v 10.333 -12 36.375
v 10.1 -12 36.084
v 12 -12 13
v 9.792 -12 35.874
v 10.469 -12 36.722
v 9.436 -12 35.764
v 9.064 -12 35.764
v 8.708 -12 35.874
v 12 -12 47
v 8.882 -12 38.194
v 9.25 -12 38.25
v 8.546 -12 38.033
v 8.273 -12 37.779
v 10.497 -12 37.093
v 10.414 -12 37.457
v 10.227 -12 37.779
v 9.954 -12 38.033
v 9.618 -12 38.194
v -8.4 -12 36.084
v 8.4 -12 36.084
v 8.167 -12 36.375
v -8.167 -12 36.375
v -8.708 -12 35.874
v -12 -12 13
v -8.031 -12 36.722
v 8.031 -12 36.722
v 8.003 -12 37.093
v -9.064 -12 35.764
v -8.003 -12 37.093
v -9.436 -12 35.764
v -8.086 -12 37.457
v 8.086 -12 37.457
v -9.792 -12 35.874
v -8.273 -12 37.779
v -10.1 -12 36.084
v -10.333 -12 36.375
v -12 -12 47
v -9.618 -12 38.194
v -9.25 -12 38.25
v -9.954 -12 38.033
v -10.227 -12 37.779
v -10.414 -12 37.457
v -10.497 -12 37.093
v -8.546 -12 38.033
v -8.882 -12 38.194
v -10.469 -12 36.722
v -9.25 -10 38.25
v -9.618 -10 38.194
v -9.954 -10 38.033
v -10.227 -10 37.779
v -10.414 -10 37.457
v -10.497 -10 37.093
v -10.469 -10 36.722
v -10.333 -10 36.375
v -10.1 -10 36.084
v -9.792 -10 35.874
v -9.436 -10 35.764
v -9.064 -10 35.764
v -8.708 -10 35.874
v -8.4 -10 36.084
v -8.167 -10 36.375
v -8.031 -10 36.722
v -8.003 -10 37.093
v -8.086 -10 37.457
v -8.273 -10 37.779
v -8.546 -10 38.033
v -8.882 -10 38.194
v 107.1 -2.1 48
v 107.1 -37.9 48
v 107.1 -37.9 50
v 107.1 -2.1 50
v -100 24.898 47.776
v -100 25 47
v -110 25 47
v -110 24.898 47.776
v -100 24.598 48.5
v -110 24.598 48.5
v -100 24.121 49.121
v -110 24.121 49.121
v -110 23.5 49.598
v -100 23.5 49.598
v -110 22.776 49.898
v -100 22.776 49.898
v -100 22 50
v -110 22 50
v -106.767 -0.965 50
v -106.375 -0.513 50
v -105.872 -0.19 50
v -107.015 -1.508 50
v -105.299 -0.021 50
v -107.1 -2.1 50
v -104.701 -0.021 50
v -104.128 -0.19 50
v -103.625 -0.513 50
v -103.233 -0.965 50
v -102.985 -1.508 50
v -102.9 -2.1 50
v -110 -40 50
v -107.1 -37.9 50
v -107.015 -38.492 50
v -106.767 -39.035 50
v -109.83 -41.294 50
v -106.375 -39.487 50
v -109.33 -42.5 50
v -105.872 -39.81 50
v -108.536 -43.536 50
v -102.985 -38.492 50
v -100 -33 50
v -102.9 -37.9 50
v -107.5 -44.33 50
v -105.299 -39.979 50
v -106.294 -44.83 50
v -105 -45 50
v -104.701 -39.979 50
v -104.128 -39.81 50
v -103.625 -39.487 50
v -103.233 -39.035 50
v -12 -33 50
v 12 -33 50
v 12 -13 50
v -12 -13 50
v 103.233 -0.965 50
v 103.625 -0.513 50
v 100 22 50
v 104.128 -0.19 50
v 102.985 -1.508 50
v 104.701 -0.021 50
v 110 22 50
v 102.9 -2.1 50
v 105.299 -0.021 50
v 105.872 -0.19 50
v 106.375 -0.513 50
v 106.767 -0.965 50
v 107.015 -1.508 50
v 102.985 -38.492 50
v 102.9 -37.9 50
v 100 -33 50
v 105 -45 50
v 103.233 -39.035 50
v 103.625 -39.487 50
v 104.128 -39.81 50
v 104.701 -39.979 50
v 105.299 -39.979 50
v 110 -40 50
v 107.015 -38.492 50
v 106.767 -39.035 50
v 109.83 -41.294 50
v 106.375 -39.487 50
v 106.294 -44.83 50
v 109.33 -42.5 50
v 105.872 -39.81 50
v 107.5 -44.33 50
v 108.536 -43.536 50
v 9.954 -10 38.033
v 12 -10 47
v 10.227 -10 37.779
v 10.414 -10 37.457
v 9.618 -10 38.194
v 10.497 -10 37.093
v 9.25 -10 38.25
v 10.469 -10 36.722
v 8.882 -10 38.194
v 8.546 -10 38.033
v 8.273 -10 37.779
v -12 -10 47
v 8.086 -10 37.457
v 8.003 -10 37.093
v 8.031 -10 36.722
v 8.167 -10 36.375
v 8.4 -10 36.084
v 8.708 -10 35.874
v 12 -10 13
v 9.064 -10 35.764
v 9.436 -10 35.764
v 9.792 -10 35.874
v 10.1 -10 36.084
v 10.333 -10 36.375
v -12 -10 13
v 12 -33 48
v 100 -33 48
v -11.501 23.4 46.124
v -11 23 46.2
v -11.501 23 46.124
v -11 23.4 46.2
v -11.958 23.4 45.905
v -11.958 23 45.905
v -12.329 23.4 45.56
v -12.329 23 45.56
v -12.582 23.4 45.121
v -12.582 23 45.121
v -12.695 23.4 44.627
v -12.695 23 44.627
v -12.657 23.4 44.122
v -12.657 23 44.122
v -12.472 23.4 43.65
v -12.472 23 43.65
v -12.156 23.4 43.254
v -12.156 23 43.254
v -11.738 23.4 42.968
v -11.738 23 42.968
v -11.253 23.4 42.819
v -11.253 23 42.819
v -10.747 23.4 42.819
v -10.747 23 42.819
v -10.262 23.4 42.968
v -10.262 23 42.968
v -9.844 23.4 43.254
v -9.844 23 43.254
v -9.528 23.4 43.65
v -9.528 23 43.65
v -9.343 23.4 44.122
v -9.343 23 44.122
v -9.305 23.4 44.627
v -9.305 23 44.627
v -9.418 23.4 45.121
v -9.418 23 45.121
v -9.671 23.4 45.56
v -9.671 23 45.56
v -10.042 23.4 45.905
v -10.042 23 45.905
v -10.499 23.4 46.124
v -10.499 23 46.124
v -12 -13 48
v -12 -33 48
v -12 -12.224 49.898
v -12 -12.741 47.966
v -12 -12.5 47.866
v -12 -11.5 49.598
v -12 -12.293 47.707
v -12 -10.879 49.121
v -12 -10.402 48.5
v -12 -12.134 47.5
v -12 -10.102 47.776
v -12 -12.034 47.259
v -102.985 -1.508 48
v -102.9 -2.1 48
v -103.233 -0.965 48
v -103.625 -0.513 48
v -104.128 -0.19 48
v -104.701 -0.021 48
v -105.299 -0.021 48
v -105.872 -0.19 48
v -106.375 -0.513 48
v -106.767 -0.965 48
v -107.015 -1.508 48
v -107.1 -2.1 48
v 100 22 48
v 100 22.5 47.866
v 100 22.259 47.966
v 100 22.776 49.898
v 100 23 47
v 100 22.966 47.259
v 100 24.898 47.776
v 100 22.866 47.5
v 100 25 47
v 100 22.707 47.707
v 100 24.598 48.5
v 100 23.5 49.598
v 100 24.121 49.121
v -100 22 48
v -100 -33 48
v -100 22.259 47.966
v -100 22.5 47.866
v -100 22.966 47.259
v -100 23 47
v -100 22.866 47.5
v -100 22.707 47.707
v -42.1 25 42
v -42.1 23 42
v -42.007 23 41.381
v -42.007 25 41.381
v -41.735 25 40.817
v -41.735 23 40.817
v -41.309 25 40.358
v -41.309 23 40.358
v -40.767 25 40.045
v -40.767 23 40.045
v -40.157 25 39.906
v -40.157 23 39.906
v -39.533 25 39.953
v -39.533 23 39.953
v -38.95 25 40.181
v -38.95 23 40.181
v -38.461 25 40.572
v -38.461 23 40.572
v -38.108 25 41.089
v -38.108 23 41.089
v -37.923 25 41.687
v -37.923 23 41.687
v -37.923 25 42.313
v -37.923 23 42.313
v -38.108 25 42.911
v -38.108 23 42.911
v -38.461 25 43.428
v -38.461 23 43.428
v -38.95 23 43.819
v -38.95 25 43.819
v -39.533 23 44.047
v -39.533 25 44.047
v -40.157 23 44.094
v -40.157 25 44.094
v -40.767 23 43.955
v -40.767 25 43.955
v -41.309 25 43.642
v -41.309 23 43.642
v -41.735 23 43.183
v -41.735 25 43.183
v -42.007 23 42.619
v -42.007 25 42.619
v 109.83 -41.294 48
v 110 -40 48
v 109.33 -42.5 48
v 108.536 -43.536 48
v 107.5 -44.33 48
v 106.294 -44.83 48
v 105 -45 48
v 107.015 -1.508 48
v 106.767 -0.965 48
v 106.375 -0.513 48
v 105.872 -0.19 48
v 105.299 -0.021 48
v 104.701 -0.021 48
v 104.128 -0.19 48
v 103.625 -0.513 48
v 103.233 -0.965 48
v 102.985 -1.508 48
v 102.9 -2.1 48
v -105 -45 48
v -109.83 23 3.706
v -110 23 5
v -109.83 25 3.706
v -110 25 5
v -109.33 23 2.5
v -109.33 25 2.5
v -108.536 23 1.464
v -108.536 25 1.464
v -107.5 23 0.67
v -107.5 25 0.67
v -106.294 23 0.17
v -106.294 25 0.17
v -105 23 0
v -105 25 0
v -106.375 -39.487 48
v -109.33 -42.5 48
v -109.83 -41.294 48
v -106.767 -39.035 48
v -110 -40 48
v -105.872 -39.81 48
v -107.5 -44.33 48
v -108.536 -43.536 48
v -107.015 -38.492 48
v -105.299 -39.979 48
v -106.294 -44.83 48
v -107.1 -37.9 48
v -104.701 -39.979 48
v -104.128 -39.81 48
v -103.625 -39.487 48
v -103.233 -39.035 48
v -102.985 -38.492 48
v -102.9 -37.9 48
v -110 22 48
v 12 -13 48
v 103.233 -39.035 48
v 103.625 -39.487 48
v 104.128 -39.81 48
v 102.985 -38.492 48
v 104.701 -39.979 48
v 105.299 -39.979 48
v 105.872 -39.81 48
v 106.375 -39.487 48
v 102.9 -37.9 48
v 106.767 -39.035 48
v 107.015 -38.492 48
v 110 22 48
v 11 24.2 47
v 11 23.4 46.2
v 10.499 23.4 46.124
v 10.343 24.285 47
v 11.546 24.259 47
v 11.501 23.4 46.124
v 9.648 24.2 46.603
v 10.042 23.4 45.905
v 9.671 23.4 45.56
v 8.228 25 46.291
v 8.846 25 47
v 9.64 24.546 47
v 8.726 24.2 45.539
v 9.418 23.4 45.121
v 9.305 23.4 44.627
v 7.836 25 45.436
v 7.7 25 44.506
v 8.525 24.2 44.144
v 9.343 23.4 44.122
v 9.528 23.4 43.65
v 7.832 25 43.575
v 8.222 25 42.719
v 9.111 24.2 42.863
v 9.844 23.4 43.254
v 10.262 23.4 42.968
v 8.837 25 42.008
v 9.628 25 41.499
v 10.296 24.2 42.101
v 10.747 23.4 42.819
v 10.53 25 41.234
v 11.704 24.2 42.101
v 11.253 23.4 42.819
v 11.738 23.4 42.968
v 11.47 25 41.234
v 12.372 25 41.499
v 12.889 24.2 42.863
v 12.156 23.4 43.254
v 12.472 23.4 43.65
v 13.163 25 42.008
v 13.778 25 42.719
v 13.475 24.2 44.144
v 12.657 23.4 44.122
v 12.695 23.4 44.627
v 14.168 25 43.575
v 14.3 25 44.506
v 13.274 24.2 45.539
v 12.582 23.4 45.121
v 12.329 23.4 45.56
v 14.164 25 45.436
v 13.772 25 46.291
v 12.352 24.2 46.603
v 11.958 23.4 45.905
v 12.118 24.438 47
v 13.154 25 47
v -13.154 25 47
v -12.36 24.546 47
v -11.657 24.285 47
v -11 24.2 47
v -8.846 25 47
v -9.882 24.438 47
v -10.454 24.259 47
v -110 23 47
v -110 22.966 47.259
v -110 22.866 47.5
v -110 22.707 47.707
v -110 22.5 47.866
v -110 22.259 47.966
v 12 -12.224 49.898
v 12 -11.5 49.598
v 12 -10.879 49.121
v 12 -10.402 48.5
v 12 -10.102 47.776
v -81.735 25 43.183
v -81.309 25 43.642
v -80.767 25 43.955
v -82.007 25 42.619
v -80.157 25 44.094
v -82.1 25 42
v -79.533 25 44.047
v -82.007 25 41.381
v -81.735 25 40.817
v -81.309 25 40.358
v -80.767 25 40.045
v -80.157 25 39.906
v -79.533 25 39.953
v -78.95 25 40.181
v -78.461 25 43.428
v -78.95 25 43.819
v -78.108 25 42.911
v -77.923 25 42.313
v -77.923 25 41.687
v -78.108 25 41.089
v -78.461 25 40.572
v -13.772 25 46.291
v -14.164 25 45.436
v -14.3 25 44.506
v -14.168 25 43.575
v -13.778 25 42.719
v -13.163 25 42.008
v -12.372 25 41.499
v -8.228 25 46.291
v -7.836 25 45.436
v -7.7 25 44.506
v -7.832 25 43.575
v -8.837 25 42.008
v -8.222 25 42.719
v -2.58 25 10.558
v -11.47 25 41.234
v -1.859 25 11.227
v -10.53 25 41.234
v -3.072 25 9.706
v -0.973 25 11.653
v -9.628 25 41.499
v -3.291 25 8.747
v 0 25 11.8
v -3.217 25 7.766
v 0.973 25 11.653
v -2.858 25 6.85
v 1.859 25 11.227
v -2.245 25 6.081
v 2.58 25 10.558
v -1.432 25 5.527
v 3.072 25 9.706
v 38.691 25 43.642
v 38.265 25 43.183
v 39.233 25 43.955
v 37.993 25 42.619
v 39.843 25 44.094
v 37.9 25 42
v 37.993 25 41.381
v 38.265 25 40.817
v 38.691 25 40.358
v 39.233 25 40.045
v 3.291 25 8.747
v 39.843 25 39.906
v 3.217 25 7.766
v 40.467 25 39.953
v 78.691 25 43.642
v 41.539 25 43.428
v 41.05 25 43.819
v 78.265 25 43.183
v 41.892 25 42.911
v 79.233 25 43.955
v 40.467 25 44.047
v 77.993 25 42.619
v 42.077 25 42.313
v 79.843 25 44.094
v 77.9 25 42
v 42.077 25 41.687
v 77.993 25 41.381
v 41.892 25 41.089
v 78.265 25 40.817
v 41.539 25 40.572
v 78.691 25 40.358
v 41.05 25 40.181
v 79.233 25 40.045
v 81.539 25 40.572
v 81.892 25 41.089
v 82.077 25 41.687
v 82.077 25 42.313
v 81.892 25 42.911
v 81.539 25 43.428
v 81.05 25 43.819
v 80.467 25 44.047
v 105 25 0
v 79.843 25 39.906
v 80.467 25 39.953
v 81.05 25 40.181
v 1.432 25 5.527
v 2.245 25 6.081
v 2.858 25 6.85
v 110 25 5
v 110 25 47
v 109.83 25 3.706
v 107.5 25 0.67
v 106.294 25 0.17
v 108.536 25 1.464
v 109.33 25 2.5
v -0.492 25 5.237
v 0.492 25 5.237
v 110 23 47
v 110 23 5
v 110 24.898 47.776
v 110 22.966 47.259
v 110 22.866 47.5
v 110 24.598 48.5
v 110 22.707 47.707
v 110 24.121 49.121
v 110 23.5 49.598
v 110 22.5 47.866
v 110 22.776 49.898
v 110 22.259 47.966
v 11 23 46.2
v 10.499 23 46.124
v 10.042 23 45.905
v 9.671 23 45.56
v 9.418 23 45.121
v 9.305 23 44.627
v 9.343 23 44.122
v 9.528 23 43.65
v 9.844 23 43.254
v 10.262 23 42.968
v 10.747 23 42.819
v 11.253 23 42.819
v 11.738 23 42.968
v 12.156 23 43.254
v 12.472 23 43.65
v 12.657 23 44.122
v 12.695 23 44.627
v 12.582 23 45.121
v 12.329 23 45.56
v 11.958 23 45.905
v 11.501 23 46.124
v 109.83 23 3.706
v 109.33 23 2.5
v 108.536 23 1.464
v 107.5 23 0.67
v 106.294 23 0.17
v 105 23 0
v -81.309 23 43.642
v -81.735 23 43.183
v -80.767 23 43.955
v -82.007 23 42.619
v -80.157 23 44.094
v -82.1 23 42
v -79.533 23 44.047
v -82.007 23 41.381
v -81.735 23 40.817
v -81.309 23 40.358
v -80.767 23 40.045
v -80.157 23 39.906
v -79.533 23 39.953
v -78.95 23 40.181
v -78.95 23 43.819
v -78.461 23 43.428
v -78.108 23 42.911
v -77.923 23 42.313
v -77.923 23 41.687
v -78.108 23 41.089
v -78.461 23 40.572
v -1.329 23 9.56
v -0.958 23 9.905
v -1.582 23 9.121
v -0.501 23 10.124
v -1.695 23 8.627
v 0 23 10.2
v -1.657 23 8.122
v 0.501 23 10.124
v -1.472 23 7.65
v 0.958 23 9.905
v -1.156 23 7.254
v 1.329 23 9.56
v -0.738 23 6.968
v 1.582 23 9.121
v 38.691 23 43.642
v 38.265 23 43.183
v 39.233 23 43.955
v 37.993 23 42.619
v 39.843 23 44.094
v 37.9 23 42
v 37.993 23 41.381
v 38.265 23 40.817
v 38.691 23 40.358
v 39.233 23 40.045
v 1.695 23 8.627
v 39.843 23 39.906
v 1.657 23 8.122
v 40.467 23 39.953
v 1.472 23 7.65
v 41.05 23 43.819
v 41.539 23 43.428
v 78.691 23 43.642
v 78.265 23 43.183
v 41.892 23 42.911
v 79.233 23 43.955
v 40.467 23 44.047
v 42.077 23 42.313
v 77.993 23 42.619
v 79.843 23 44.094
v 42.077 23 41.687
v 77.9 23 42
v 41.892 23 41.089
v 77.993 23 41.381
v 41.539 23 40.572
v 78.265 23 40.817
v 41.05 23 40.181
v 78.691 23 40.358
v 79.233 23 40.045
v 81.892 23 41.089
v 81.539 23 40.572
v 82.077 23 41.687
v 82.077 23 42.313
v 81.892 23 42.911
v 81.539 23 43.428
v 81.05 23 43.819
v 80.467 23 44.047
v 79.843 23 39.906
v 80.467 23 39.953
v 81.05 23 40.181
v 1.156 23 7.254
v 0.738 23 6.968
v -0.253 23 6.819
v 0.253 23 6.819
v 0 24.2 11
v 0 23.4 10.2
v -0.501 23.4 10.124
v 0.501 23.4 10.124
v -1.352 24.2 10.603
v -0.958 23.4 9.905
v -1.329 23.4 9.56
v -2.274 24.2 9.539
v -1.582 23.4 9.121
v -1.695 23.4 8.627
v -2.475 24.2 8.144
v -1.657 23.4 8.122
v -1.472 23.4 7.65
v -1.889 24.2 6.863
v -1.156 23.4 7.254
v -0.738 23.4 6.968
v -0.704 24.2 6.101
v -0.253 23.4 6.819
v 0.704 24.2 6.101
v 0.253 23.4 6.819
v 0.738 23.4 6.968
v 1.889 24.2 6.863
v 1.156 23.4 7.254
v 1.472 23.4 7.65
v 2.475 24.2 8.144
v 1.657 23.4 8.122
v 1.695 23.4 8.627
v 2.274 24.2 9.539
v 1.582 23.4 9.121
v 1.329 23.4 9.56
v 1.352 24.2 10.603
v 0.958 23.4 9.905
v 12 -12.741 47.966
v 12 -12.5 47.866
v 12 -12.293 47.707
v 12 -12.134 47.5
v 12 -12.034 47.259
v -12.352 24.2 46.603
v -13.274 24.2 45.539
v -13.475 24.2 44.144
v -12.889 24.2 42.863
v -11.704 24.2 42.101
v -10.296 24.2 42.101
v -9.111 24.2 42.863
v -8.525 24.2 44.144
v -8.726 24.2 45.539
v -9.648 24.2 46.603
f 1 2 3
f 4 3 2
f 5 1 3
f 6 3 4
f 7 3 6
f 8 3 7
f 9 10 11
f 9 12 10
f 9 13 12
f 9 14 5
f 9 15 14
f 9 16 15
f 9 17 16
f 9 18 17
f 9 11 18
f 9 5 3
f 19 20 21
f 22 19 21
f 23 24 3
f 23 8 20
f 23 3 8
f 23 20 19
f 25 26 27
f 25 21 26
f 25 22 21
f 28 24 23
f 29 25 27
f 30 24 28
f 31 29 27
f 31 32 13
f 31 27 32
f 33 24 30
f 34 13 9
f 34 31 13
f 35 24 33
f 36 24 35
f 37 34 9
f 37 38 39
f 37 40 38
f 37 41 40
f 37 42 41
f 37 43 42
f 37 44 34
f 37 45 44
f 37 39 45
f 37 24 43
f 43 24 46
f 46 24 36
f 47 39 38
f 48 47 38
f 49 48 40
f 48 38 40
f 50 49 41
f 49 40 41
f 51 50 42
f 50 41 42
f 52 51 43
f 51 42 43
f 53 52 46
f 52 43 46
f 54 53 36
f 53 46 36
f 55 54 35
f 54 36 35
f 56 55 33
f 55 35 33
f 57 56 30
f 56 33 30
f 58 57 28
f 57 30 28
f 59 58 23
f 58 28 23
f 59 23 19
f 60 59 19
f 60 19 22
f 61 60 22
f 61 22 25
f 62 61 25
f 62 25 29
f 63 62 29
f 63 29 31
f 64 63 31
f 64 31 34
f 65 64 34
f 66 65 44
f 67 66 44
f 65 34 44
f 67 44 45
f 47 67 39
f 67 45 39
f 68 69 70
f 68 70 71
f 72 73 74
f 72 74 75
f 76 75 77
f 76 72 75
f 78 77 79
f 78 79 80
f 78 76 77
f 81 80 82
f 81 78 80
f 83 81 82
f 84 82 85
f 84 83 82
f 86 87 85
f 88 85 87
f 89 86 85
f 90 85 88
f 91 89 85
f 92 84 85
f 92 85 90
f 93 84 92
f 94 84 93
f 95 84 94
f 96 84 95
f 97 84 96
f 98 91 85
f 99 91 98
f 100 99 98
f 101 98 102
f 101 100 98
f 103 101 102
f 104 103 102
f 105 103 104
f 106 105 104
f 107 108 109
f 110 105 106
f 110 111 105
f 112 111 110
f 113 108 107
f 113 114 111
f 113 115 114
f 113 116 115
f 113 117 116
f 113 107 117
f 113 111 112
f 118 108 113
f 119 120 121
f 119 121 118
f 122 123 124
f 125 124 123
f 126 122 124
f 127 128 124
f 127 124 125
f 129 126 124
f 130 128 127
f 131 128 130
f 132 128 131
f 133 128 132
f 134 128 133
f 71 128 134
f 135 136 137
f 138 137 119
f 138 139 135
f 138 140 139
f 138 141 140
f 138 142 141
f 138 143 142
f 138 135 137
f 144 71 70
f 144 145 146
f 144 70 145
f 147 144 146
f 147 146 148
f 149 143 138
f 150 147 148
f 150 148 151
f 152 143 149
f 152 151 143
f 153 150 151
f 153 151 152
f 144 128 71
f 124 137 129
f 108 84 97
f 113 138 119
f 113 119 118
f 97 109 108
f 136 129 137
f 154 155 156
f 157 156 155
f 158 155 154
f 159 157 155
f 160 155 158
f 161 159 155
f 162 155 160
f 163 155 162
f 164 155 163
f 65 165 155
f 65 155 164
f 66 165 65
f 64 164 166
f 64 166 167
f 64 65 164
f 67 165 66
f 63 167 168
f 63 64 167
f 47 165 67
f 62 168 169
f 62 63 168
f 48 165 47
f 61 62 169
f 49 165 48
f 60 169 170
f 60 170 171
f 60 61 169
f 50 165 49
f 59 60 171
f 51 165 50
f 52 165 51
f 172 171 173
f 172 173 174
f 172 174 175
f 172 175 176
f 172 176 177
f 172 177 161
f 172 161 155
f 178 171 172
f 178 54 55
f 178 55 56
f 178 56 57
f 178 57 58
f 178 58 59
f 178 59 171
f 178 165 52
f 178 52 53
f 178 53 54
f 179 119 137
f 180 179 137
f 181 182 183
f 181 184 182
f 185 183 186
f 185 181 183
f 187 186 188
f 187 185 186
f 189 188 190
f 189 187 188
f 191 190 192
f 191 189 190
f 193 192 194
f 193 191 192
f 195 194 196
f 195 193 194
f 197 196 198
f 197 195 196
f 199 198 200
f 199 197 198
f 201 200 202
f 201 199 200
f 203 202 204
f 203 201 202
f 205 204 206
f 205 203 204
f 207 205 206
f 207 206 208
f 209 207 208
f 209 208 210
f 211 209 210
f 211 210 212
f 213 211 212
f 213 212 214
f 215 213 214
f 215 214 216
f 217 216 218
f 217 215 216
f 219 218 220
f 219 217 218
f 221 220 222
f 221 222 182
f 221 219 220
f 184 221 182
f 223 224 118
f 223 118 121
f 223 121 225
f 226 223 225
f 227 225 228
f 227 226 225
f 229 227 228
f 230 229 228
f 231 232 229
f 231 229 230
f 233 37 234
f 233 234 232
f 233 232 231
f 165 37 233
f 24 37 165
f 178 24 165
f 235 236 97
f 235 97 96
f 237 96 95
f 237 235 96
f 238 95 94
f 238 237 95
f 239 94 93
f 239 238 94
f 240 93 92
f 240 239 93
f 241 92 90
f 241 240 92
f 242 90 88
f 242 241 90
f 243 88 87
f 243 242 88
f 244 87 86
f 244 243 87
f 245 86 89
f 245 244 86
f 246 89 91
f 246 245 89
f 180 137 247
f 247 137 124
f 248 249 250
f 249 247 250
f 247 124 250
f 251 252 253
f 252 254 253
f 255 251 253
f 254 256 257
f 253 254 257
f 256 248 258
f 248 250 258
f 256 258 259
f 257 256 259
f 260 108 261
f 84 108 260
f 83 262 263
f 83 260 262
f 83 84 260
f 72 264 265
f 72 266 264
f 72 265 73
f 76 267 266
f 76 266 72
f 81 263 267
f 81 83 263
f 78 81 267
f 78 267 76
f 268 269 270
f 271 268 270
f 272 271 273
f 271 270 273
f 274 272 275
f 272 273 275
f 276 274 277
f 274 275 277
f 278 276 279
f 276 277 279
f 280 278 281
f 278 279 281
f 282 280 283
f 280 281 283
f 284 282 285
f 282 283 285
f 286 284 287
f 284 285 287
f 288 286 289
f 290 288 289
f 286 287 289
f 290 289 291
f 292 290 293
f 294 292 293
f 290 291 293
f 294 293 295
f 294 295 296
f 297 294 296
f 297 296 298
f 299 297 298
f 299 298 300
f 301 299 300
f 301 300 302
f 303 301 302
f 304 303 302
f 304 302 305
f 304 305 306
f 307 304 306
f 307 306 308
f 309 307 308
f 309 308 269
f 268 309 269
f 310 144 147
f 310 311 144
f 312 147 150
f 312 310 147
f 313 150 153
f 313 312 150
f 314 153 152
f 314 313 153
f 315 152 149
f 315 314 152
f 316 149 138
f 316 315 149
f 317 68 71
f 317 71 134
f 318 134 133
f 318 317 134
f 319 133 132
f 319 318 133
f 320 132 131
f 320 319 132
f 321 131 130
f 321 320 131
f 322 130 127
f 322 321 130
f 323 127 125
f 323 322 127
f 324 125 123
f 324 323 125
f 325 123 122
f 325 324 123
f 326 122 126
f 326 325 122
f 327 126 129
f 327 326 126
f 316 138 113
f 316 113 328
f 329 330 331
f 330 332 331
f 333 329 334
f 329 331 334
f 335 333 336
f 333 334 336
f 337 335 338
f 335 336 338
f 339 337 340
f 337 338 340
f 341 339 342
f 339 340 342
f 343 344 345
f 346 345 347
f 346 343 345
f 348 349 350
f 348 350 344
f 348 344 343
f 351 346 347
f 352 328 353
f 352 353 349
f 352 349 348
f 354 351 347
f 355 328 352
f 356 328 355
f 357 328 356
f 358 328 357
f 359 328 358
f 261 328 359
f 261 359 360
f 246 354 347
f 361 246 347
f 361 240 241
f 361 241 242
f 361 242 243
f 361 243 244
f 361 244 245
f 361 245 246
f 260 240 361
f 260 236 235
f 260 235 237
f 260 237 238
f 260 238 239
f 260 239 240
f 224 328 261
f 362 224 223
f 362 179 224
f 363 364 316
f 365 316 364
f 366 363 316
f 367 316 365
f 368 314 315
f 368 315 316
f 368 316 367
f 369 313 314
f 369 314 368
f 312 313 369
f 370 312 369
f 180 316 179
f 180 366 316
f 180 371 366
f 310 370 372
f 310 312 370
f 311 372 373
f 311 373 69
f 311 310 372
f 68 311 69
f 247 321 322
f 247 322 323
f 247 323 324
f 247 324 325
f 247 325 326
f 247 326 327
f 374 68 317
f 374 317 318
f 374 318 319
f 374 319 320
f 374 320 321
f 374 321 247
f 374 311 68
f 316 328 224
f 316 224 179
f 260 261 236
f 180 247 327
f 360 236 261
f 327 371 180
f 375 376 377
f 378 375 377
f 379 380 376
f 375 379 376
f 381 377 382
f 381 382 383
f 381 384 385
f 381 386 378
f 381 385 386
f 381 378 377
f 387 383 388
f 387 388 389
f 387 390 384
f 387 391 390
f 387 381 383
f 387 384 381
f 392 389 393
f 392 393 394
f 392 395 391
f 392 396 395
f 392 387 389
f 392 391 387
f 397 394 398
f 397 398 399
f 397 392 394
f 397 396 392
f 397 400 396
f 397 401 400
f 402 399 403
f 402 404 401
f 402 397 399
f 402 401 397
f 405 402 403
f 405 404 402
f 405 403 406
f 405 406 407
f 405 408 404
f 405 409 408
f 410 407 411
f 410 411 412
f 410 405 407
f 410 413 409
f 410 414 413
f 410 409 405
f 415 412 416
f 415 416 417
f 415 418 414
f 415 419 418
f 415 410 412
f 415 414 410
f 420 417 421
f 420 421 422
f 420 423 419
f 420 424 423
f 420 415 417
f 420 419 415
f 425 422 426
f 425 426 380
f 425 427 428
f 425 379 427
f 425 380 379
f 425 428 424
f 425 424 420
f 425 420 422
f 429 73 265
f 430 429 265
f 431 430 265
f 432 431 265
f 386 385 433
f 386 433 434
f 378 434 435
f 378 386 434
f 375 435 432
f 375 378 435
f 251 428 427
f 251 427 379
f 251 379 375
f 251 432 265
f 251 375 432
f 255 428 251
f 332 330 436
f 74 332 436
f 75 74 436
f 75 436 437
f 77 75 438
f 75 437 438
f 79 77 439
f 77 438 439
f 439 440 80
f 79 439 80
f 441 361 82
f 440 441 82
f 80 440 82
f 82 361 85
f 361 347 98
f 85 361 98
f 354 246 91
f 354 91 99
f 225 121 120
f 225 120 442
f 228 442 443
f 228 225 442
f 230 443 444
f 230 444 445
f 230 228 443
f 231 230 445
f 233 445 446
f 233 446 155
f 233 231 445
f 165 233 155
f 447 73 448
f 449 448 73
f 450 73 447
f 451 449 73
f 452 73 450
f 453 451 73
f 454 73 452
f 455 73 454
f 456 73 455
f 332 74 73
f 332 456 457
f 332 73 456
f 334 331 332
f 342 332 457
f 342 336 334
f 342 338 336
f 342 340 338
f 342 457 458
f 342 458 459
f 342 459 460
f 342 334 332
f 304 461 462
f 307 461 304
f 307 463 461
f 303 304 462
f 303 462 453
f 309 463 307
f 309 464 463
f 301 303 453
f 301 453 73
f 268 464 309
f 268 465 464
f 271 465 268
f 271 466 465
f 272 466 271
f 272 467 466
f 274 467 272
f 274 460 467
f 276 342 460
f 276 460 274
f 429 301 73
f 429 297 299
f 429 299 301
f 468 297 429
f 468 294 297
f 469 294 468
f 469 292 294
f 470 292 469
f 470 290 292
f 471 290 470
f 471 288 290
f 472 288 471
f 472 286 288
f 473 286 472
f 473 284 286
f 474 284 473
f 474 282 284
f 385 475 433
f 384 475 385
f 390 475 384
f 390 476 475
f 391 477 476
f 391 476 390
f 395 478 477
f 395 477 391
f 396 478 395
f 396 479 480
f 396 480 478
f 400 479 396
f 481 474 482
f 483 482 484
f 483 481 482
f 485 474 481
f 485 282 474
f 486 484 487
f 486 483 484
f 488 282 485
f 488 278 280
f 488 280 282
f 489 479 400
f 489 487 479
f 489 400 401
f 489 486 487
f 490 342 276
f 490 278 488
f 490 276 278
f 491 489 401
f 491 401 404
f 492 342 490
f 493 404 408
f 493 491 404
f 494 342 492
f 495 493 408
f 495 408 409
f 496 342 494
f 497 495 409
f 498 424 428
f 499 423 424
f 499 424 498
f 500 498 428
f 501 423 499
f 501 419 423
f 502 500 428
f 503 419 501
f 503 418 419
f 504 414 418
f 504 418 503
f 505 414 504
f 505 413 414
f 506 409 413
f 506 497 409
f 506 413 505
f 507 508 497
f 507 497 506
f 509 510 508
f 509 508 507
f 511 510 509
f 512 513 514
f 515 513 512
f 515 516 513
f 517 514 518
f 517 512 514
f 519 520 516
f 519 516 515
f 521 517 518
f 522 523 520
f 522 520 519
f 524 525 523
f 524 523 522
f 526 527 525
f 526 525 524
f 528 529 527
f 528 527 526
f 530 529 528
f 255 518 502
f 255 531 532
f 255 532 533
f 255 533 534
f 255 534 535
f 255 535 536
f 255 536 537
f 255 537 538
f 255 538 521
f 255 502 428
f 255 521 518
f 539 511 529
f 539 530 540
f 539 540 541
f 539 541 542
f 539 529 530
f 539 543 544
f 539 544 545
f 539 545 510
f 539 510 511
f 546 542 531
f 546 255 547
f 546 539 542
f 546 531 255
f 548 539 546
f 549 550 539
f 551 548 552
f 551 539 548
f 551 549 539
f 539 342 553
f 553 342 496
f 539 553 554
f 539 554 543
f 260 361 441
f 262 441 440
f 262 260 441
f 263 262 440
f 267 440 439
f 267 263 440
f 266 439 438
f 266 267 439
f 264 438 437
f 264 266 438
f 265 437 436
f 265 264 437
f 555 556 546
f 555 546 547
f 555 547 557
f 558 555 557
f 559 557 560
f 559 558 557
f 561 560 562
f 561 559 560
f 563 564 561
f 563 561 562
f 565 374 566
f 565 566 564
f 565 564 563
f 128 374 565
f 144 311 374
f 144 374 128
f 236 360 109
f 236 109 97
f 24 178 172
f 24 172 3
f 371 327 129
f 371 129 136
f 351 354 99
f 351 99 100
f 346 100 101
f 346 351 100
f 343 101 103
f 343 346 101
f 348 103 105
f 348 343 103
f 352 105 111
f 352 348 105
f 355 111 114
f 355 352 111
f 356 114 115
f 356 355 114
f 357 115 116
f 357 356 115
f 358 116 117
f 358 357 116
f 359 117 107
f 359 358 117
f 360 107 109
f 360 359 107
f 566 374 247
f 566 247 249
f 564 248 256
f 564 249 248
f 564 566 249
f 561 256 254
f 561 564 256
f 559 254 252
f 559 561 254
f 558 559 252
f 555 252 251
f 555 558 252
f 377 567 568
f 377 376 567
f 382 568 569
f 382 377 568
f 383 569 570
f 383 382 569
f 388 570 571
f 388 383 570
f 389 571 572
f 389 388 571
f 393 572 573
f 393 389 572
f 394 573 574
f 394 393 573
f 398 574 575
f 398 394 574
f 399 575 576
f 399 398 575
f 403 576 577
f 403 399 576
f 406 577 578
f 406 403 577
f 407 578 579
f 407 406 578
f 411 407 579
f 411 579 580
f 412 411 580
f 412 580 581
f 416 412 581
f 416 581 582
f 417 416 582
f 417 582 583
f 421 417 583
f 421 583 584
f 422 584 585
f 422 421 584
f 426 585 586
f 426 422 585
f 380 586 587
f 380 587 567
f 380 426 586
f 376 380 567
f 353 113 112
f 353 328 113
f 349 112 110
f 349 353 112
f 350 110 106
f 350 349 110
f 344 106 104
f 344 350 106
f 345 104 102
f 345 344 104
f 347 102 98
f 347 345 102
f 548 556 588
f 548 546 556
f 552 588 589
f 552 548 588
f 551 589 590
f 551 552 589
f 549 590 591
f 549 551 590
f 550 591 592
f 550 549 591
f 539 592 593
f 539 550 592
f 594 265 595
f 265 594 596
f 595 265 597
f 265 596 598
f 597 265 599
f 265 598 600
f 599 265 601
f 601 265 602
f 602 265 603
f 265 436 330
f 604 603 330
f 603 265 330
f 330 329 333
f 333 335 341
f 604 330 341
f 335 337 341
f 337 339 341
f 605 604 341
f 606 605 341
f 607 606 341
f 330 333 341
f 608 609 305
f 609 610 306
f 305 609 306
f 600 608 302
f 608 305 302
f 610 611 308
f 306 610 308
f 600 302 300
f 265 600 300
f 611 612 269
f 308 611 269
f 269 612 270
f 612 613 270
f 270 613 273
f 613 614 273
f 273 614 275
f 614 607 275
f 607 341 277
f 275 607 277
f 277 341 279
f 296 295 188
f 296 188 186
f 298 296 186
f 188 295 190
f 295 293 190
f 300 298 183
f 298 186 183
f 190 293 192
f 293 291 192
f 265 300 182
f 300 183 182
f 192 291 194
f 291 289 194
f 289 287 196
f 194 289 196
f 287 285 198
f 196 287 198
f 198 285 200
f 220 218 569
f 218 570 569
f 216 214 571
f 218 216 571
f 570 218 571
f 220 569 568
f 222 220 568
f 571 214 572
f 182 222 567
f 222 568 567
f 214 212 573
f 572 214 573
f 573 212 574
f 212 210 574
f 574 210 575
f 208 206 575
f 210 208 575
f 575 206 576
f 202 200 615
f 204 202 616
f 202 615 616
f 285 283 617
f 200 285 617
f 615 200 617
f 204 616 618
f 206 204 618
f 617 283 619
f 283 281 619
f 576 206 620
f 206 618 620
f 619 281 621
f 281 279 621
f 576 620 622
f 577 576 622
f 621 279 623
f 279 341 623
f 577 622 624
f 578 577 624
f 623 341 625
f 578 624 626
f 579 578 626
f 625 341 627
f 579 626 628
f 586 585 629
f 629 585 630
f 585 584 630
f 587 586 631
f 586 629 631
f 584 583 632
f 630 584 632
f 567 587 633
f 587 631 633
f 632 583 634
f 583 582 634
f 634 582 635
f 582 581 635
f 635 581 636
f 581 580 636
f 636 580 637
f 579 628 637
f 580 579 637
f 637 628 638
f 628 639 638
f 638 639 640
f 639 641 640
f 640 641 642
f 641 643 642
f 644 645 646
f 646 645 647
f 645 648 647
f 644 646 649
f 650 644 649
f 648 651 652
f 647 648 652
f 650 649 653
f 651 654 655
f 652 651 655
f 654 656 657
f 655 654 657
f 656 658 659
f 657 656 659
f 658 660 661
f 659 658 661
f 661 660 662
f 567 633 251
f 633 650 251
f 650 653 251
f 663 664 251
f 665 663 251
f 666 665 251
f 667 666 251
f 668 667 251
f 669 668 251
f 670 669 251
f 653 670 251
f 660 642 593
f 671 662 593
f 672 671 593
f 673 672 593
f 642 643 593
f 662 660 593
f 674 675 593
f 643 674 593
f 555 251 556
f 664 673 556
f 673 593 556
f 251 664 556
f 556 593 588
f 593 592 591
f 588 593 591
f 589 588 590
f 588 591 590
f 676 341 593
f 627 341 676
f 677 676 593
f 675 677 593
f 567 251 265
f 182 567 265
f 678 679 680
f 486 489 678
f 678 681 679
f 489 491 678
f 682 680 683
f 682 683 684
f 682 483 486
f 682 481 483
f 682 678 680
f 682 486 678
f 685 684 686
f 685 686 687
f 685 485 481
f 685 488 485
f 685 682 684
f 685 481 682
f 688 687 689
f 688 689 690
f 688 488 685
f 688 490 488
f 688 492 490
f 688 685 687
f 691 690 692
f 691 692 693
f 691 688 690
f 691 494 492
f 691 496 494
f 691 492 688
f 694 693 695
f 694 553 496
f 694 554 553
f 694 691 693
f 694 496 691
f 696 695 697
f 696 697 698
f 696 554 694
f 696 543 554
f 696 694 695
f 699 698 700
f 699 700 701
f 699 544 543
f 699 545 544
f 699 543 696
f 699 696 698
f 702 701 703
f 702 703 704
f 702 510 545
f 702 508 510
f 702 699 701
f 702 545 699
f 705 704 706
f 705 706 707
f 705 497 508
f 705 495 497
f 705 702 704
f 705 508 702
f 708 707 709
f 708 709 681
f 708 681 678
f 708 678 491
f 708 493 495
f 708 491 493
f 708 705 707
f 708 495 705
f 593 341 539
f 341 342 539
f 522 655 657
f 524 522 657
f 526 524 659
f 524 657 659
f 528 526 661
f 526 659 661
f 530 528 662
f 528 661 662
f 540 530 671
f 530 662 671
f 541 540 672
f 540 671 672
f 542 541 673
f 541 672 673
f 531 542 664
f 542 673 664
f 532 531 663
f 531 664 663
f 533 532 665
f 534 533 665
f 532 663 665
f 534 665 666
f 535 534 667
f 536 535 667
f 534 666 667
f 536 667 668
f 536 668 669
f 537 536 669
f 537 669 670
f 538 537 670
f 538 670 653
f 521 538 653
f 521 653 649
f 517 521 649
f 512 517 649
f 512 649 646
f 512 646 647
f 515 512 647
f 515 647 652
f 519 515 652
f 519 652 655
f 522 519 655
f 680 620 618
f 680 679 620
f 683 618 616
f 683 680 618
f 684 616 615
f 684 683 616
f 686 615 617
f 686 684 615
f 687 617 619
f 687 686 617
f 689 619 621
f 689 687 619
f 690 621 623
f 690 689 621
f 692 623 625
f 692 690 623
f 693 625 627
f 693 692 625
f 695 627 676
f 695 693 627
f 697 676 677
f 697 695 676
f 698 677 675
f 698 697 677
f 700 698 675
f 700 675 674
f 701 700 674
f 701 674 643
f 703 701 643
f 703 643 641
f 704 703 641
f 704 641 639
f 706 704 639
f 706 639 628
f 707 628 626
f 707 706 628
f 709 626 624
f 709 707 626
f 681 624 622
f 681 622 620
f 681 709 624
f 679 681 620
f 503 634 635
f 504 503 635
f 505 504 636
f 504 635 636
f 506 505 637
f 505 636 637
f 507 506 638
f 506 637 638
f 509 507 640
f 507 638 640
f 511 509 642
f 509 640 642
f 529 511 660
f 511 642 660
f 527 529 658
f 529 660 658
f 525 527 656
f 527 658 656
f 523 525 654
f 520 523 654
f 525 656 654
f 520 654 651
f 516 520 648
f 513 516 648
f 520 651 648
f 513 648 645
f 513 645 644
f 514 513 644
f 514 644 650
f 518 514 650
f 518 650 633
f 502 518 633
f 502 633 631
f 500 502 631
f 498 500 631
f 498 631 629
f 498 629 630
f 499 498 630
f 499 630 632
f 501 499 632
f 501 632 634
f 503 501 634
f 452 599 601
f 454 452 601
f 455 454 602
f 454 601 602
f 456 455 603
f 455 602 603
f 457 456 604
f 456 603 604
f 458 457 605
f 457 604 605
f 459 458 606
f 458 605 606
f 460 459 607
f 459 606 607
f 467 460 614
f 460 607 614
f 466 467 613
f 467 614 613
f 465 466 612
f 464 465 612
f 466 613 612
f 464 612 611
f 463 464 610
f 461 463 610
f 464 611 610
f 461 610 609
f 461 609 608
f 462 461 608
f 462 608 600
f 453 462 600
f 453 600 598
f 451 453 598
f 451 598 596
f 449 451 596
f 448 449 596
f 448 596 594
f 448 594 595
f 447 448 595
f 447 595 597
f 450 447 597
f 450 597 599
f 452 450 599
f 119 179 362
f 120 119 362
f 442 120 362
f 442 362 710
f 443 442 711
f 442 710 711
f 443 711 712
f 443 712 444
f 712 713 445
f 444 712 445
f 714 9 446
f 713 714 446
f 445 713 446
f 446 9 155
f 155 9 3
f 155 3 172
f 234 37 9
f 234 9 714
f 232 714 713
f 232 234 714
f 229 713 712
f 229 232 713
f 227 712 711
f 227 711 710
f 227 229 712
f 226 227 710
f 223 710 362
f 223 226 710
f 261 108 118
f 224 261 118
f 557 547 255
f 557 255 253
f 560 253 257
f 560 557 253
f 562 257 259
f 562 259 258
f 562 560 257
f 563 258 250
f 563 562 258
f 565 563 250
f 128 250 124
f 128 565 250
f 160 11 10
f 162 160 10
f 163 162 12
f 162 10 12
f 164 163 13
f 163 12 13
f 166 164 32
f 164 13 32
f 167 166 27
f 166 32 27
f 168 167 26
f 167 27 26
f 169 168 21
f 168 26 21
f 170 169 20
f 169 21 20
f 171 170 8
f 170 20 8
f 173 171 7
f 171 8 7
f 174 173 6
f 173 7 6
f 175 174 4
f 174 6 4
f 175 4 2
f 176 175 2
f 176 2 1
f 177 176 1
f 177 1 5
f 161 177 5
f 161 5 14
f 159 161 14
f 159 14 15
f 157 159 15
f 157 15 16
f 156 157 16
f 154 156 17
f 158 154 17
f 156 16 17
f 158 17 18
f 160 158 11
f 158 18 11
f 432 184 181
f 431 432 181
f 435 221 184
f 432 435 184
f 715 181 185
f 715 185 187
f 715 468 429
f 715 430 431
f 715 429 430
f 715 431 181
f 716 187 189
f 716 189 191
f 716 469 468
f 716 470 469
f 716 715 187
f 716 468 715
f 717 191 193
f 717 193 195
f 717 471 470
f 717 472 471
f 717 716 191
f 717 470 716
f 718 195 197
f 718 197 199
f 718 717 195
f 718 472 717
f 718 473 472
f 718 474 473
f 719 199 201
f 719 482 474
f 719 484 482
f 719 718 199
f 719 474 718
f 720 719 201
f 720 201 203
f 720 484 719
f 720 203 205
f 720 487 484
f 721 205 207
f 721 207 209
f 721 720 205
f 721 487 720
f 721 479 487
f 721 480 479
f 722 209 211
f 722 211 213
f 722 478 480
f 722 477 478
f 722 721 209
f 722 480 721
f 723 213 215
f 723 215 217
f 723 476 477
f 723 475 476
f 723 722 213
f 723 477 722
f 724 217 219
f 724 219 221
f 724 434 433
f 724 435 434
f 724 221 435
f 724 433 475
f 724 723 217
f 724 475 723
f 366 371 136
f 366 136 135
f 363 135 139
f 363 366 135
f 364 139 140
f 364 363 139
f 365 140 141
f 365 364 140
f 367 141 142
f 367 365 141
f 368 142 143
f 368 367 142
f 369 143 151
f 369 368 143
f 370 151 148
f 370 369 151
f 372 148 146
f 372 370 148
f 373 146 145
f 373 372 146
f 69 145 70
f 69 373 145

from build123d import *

# Parameters (mm, degrees)
SM_BASE_FLANGE_1_OUTLINE_W       = 220
SM_BASE_FLANGE_1_OUTLINE_H       = 2
SM_BASE_FLANGE_1_DEPTH           = 50
HOLE_WIZARD_1_AT_2_COUNT         = 2
HOLE_WIZARD_1_AT_2_PITCH         = 37.643060449
HOLE_WIZARD_1_AT_3_COUNT         = 2
HOLE_WIZARD_1_AT_3_PITCH         = 37.643060449
HOLE_WIZARD_4_2_4_2_1_D          = 4.2
SM_EDGE_FLANGE_1_STRIP_W         = 10
SM_EDGE_FLANGE_1_STRIP_H         = 2
SM_EDGE_FLANGE_1_STRIP_CUT_DEPTH = 220
SM_EDGE_FLANGE_1_DEPTH           = 220
SKETCH_16_W                      = 200
SKETCH_16_H                      = 58
CUT_EXTRUDE_1_DEPTH              = 3
SM_EDGE_FLANGE_2_DEPTH           = 24
HOLE_START                       = 48
HOLE_WIZARD_4_2_4_2_1_2_DEPTH    = 2
FILLET_1_R                       = 5
SKETCH_23_W                      = 1.25
SKETCH_23_H                      = 35
HOLE_WIZARD_M3_1_AT_2_COUNT      = 2
HOLE_WIZARD_M3_1_AT_2_PITCH      = 18.5


# Read off the part's stored shape, not the designer's step: 基体-法兰1, Ø4.2 (4.2) 直径槽口1
# Sheet-metal steps are written as plain solids
with BuildPart() as part:
    # 基体-法兰1 outline → 基体-法兰1 (new body)
    with BuildSketch(Plane.XY):
        with Locations((0, 24)):
            Rectangle(SM_BASE_FLANGE_1_OUTLINE_W, SM_BASE_FLANGE_1_OUTLINE_H)
    extrude(amount=SM_BASE_FLANGE_1_DEPTH)

    # 草图9 → 打孔尺寸(%根据)开槽沉头木螺钉的类型1 (revolve, cut)
    with BuildSketch(Plane(origin=(0, 25, 8.5), x_dir=(0, 0, 1), z_dir=(1, 0, 0))):
        Polygon((0, 0), (0, 2), (1.7, 2), (1.7, 1.6), (3.3, 0), align=None)
    hole_wizard_1 = revolve(axis=Axis((0, 31.35, 8.5), (0, -1, 0)), mode=Mode.SUBTRACT)

    # 打孔尺寸(%根据)开槽沉头木螺钉的类型1 at 2: 打孔尺寸(%根据)开槽沉头木螺钉的类型1 ×2
    with Locations(*[Vector(-0.2922185355990202, 0, 0.956351571051339) * (i * HOLE_WIZARD_1_AT_2_PITCH) for i in range(1, HOLE_WIZARD_1_AT_2_COUNT)]):
        add(hole_wizard_1, mode=Mode.SUBTRACT)

    # 打孔尺寸(%根据)开槽沉头木螺钉的类型1 at 3: 打孔尺寸(%根据)开槽沉头木螺钉的类型1 ×2
    with Locations(*[Vector(0.29221853559902033, 0, 0.956351571051339) * (i * HOLE_WIZARD_1_AT_3_PITCH) for i in range(1, HOLE_WIZARD_1_AT_3_COUNT)]):
        add(hole_wizard_1, mode=Mode.SUBTRACT)

    # Hole Wizard 4.2 _4.2_ _1 (through all)
    with Locations(Plane(origin=(0, 25, 0), x_dir=(1, 0, 0), z_dir=(0, 1, 0))):
        with Locations((-40, -42), (-80, -42), (40, -42), (80, -42)):
            Hole(HOLE_WIZARD_4_2_4_2_1_D / 2)

    # 边线-法兰1 strip (across the edge) → 边线-法兰1 strip cut (cut)
    with BuildSketch(Plane(origin=(110, 23, 50), x_dir=(0, 0, -1), z_dir=(-1, 0, 0))):
        with Locations((-2, -1)):
            Rectangle(SM_EDGE_FLANGE_1_STRIP_W, SM_EDGE_FLANGE_1_STRIP_H)
    extrude(amount=SM_EDGE_FLANGE_1_STRIP_CUT_DEPTH, mode=Mode.SUBTRACT)

    # 边线-法兰1 section (across the edge) → 边线-法兰1 (add)
    with BuildSketch(Plane(origin=(110, 23, 50), x_dir=(0, 0, -1), z_dir=(-1, 0, 0))):
        with BuildLine():
            Line((0, 1), (0, 68))
            Line((0, 68), (2, 68))
            Line((2, 68), (2, 1))
            ThreePointArc((2, 1), (2.292893219, 0.292893219), (3, 0))
            Line((3, 0), (3, -2))
            ThreePointArc((3, -2), (0.878679656, -1.121320344), (0, 1))
        make_face()
    extrude(amount=SM_EDGE_FLANGE_1_DEPTH)

    # 草图16 → 切除-拉伸1 (cut)
    with BuildSketch(Plane.XY.offset(50)):
        with Locations((0, -4)):
            Rectangle(SKETCH_16_W, SKETCH_16_H)
    extrude(amount=-CUT_EXTRUDE_1_DEPTH, mode=Mode.SUBTRACT)

    # 边线-法兰2 section (across the edge) → 边线-法兰2 (add)
    with BuildSketch(Plane(origin=(-12, -10, 48), x_dir=(0, -1, 0), z_dir=(1, 0, 0))):
        with BuildLine():
            Line((0, 1), (0, 35))
            Line((0, 35), (2, 35))
            Line((2, 35), (2, 1))
            ThreePointArc((2, 1), (2.292893219, 0.292893219), (3, 0))
            Line((3, 0), (23, 0))
            Line((23, 0), (23, -2))
            Line((23, -2), (3, -2))
            ThreePointArc((3, -2), (0.878679656, -1.121320344), (0, 1))
        make_face()
    extrude(amount=SM_EDGE_FLANGE_2_DEPTH)

    # Hole Wizard 4.2 _4.2_ _1 2 outline → Hole Wizard 4.2 _4.2_ _1 2 (cut)
    with BuildSketch(Plane.XY.offset(HOLE_START)):
        with BuildLine():
            ThreePointArc((107.1, -2.1), (105, 0), (102.9, -2.1))
            Line((102.9, -2.1), (102.9, -37.9))
            ThreePointArc((102.9, -37.9), (105, -40), (107.1, -37.9))
            Line((107.1, -37.9), (107.1, -2.1))
        make_face()
        with BuildLine():
            Line((-102.9, -37.9), (-102.9, -2.1))
            ThreePointArc((-102.9, -2.1), (-105, 0), (-107.1, -2.1))
            Line((-107.1, -2.1), (-107.1, -37.9))
            ThreePointArc((-107.1, -37.9), (-105, -40), (-102.9, -37.9))
        make_face()
    extrude(amount=HOLE_WIZARD_4_2_4_2_1_2_DEPTH, mode=Mode.SUBTRACT)

    # 圆角1
    fillet_1_edges = [part.edges().sort_by_distance(p)[0] for p in [
        (-110, 24, 0),
        (110, 24, 0),
        (110, -45, 49),
        (-110, -45, 49),
    ]]
    fillet(fillet_1_edges, radius=FILLET_1_R)

    # 草图23 → M3 螺纹孔1 (revolve, cut)
    with BuildSketch(Plane(origin=(9.25, -10, 37), x_dir=(0, 0, 1), z_dir=(1, 0, 0))):
        with Locations((0.625, 17.5)):
            Rectangle(SKETCH_23_W, SKETCH_23_H)
    hole_wizard_m3_1 = revolve(axis=Axis((9.25, -3.65, 37), (0, -1, 0)), mode=Mode.SUBTRACT)

    # M3 螺纹孔1 at 2: M3 螺纹孔1 ×2
    with Locations(*[(-i * HOLE_WIZARD_M3_1_AT_2_PITCH, 0, 0) for i in range(1, HOLE_WIZARD_M3_1_AT_2_COUNT)]):
        add(hole_wizard_m3_1, mode=Mode.SUBTRACT)


solid = part.part
